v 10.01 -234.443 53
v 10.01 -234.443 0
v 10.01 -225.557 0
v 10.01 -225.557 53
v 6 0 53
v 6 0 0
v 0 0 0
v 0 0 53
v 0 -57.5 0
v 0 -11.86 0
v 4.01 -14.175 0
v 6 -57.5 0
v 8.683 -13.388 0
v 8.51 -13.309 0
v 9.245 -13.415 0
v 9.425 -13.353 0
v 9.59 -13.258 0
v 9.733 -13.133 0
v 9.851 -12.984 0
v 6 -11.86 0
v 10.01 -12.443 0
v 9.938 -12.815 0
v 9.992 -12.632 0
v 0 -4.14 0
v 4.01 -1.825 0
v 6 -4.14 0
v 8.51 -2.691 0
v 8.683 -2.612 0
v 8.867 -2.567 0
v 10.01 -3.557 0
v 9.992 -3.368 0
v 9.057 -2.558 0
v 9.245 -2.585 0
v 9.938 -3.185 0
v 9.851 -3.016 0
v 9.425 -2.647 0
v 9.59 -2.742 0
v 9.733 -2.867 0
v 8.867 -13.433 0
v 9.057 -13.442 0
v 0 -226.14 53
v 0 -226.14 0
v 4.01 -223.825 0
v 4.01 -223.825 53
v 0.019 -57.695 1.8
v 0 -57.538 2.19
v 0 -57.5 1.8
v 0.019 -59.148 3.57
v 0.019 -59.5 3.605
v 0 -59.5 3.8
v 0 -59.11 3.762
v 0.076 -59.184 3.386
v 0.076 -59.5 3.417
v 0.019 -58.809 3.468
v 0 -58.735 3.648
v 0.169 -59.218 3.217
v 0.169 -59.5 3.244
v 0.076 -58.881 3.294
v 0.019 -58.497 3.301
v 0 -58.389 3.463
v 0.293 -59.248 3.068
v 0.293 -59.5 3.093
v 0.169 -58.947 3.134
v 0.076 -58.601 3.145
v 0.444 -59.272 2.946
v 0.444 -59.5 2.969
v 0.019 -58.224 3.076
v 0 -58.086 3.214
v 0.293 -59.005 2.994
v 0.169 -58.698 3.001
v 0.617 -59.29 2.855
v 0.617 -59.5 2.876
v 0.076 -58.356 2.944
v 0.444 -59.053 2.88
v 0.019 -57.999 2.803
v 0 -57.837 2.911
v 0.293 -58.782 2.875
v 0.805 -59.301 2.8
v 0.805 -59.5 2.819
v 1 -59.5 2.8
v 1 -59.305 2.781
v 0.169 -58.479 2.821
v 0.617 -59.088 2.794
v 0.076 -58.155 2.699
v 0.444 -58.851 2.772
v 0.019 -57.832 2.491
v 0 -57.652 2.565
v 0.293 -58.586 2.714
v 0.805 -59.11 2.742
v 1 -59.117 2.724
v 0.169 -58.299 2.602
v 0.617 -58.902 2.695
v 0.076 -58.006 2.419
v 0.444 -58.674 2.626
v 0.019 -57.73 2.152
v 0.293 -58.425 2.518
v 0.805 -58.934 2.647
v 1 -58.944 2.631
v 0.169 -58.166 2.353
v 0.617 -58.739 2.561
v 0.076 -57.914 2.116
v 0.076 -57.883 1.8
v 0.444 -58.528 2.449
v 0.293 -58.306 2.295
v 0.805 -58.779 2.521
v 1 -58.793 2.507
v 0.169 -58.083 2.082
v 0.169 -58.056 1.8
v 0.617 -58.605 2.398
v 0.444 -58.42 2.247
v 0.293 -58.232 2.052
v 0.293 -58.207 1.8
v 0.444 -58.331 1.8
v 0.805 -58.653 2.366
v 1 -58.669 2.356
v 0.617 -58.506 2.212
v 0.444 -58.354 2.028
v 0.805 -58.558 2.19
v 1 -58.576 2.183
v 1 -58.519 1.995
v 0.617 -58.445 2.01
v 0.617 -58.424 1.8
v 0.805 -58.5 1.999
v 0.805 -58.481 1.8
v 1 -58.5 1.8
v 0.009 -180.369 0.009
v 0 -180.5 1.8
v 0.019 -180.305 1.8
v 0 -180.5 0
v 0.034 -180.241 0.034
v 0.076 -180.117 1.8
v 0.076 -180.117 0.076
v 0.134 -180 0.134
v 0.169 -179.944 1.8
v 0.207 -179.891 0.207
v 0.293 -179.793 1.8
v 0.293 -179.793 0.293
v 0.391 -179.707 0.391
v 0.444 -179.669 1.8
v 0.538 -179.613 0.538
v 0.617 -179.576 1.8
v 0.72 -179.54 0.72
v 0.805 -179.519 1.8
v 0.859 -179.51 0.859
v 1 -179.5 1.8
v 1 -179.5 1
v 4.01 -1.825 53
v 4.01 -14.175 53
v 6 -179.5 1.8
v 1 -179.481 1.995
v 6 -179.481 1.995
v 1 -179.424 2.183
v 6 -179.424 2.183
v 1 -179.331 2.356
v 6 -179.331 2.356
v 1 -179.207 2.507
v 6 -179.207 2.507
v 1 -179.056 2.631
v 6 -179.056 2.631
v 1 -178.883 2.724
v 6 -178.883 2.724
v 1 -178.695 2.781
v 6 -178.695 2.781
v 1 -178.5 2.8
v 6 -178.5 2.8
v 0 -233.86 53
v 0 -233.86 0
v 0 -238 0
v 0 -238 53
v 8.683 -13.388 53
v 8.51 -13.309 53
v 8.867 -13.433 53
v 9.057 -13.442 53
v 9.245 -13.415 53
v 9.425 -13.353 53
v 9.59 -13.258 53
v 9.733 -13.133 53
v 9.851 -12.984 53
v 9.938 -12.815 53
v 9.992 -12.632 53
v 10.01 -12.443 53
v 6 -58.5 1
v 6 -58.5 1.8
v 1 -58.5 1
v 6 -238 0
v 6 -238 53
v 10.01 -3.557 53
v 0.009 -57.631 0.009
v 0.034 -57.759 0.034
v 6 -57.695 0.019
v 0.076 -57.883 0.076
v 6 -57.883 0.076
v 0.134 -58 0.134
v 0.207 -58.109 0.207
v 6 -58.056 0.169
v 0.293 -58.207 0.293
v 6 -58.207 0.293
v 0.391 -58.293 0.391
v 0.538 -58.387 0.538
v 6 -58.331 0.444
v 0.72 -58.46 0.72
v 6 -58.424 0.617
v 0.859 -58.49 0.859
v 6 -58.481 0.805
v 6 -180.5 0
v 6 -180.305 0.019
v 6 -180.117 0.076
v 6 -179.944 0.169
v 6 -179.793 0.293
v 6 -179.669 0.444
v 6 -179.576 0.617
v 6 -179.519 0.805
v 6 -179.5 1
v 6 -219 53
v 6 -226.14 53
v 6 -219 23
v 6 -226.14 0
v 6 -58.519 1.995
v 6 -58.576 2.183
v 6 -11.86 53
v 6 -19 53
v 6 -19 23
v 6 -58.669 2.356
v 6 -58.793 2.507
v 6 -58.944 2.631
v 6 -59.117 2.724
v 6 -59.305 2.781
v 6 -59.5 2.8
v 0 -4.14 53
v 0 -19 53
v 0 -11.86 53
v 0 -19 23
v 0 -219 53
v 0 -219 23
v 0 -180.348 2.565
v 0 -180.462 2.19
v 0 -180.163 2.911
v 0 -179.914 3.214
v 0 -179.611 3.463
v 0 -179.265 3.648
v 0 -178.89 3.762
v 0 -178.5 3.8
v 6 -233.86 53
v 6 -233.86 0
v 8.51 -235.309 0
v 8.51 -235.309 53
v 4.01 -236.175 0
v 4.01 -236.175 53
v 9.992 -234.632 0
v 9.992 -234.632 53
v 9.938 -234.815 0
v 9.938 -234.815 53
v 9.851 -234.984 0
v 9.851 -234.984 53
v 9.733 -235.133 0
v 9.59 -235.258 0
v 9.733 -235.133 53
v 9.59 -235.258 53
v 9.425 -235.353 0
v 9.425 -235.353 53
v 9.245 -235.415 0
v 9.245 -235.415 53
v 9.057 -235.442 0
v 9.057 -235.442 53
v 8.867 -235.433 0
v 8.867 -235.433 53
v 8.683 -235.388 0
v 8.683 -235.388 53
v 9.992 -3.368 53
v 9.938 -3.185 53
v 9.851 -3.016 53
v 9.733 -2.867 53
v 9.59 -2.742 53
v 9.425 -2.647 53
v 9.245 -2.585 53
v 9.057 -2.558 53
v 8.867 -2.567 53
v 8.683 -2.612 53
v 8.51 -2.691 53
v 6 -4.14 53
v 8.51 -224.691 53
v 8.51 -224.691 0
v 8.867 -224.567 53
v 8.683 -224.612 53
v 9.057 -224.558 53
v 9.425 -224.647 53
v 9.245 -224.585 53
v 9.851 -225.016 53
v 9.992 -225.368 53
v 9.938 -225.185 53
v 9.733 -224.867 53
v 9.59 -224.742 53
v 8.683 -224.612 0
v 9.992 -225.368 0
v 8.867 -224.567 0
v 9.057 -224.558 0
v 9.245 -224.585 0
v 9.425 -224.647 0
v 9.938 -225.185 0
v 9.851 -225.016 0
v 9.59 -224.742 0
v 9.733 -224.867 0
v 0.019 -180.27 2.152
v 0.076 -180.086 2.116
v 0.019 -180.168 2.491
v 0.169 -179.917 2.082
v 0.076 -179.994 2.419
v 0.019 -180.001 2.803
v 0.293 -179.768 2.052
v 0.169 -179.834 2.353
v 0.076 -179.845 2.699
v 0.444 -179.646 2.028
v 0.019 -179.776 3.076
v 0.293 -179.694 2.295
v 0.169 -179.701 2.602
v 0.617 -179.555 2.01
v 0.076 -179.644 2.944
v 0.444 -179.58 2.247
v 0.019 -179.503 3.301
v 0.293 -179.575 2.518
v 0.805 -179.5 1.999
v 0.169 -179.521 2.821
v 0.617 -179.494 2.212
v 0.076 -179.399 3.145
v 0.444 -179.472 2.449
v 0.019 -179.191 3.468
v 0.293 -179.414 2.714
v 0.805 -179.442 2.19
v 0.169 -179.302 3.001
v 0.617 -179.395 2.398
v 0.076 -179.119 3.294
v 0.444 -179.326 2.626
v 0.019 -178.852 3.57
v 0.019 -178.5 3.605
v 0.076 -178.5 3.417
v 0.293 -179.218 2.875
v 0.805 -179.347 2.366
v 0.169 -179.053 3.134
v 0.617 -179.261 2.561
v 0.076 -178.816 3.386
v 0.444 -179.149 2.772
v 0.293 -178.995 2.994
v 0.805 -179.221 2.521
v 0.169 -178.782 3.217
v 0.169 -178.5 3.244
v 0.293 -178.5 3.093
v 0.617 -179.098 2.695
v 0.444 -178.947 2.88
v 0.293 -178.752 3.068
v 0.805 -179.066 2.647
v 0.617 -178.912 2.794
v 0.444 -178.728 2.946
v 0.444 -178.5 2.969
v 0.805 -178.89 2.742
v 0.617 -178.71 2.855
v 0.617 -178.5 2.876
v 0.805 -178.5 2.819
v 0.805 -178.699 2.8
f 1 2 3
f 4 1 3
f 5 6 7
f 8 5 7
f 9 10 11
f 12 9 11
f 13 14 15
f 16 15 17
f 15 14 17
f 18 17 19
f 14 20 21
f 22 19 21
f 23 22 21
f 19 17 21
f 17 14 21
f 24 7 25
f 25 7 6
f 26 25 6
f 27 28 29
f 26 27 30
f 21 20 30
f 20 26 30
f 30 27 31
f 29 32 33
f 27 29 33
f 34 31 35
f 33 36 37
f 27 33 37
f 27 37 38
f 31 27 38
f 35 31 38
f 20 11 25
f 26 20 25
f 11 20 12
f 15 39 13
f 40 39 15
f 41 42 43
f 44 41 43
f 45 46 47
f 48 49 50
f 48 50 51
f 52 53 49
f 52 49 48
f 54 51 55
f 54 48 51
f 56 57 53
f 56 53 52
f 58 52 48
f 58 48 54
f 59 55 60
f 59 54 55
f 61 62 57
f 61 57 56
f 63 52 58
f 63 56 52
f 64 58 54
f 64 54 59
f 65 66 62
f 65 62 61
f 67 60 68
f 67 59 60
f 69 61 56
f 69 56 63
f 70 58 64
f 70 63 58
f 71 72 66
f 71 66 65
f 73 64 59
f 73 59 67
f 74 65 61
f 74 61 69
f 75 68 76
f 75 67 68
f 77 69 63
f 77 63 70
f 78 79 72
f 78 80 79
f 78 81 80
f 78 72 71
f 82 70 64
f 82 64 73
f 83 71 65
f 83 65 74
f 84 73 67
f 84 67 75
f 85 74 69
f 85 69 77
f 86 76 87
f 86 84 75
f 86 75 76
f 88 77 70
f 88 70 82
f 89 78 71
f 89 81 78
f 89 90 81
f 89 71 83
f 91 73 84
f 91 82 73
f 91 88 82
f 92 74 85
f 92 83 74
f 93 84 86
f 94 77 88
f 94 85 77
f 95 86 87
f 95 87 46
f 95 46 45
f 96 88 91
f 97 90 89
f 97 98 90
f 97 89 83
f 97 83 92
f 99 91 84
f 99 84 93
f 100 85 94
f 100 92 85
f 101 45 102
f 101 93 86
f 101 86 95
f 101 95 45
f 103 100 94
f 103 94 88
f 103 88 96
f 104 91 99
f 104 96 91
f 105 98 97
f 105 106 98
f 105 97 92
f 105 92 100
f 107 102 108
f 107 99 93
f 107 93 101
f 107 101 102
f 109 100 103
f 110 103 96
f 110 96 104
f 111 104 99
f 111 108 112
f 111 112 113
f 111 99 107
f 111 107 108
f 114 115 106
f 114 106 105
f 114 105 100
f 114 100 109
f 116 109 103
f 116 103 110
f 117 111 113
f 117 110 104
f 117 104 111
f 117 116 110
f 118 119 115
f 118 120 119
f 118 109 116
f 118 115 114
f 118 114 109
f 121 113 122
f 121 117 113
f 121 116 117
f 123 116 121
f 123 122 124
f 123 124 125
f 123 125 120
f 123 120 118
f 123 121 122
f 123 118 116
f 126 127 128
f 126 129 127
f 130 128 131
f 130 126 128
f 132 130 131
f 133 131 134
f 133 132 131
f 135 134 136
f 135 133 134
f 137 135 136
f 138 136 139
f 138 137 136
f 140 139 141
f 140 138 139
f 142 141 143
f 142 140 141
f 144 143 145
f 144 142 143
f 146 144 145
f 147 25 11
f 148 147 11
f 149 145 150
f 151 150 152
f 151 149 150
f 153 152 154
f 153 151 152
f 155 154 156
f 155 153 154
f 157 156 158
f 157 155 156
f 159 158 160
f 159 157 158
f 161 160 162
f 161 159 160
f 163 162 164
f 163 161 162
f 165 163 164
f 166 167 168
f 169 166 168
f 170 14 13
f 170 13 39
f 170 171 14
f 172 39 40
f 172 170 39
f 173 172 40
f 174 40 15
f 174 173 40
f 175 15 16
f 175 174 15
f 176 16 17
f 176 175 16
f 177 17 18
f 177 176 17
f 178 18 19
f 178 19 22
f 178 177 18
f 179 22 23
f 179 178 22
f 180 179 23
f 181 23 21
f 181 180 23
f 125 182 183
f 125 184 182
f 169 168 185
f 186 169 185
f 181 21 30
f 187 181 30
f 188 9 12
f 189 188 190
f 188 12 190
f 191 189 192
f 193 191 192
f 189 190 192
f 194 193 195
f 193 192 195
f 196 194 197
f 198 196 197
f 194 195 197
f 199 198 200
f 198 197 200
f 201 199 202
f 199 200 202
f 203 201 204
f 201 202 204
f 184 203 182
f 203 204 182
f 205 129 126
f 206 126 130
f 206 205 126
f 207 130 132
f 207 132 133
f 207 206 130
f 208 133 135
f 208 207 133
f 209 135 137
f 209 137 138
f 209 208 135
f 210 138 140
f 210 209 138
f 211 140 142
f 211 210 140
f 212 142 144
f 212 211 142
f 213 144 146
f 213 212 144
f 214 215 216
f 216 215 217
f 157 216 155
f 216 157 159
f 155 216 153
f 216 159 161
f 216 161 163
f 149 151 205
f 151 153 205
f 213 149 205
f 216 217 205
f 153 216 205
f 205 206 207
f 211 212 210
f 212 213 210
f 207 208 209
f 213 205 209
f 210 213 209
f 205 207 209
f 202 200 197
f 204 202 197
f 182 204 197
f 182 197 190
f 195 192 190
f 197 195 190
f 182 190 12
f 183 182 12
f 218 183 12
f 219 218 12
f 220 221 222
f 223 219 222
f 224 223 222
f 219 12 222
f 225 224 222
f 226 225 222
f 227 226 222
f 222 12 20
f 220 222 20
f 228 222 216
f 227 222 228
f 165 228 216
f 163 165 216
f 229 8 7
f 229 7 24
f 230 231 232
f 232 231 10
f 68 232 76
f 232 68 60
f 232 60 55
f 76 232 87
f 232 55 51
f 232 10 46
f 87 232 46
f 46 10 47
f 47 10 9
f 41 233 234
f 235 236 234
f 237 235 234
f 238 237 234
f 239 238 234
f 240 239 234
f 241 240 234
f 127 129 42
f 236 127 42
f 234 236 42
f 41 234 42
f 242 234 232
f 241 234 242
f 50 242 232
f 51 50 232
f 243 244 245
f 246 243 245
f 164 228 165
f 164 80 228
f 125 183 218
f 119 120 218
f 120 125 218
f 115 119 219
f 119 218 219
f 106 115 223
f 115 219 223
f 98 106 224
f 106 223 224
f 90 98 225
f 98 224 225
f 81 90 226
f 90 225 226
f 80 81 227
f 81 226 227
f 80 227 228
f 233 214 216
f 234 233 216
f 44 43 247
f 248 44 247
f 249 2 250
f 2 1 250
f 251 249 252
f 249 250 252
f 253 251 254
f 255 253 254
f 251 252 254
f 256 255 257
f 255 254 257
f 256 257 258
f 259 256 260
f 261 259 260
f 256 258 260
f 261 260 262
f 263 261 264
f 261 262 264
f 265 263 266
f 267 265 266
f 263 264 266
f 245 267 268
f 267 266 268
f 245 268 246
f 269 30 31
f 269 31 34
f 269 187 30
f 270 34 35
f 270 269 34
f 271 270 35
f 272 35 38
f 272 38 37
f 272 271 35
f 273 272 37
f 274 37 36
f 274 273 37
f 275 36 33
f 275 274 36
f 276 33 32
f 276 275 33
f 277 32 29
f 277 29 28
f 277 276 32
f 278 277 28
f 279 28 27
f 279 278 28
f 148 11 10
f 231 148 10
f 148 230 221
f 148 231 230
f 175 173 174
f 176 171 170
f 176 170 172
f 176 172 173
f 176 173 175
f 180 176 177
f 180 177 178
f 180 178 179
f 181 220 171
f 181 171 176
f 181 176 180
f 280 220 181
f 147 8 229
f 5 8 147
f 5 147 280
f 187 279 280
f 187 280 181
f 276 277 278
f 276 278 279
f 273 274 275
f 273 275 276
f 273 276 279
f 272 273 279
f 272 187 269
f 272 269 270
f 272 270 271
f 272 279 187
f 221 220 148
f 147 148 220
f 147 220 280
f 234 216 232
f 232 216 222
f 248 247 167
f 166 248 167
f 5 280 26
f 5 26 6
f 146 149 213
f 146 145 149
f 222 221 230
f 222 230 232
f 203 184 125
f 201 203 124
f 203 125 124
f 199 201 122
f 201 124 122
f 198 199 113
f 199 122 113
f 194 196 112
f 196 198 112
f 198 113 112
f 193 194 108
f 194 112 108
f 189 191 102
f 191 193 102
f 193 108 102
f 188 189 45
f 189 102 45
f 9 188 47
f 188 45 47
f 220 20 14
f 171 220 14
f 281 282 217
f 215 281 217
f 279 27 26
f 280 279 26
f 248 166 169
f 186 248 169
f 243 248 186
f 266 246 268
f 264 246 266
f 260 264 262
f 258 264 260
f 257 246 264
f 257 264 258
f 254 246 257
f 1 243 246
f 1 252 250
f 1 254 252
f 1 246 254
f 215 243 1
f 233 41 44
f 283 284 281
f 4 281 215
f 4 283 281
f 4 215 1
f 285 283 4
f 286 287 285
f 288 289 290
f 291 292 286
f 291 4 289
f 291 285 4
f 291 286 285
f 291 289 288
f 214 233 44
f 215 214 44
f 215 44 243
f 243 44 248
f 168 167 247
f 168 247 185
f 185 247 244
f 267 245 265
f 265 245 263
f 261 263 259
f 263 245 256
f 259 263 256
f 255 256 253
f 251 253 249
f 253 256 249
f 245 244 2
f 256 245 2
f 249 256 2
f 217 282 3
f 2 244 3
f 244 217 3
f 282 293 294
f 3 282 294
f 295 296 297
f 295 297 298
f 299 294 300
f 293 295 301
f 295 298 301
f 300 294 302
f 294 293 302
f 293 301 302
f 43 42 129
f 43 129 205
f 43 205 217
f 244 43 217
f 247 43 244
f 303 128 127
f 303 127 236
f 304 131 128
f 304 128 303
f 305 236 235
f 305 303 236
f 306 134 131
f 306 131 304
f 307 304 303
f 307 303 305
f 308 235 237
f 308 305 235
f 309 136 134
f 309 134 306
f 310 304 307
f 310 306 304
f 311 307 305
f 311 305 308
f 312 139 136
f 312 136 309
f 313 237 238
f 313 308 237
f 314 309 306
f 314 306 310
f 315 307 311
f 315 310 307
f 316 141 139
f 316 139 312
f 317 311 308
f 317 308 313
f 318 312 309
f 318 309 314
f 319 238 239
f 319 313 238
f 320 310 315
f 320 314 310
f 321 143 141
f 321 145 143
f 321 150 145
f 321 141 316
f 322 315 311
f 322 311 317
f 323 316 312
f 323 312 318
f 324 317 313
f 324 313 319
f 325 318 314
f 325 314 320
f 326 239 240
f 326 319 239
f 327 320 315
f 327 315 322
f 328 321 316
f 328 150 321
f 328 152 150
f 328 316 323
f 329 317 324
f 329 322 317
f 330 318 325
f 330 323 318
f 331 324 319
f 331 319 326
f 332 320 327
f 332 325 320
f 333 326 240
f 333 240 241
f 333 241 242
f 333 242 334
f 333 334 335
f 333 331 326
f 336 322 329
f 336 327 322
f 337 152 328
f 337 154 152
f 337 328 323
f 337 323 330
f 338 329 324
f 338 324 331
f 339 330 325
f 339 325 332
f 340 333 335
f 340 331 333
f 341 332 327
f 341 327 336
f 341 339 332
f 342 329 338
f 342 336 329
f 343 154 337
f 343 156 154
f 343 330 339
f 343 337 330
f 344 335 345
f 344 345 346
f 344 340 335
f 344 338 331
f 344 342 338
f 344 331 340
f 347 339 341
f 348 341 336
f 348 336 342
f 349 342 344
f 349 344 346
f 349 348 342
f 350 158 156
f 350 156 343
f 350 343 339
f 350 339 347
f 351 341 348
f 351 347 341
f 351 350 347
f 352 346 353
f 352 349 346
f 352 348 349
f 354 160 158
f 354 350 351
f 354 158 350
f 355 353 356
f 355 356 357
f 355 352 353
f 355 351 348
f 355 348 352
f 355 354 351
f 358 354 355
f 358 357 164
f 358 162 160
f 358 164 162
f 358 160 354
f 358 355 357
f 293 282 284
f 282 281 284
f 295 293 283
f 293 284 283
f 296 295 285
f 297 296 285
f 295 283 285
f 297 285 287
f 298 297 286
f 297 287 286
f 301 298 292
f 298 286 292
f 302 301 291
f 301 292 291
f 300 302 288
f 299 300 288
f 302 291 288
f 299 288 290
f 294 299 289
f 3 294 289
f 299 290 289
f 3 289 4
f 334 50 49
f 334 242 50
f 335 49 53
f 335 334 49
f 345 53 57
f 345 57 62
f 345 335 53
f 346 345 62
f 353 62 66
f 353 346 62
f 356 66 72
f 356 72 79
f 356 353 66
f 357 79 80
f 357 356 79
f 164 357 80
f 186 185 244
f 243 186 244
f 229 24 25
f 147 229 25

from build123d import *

# Parameters (mm, degrees)
BOSS_EXTRUDE1_DEPTH = 53
CUT_EXTRUDE1_DEPTH  = 52
FILLET1_R           = 1
FILLET3_R           = 1
SKETCH4_W           = 30
SKETCH4_H           = 200
CUT_EXTRUDE2_DEPTH  = 10


with BuildPart() as part:
    # Sketch2 → Boss-Extrude1 (new body)
    with BuildSketch(Plane.XY):
        Polygon((0, 0), (0, -4.14), (4.00969762, -1.825), (4.00969762, -14.175), (0, -11.86), (0, -19), (0, -219), (0, -226.14), (4.00969762, -223.825), (4.00969762, -236.175), (0, -233.86), (0, -238), (6, -238), (6, -233.86), (10.00969762, -236.175), (10.00969762, -223.825), (6, -226.14), (6, -11.86), (10.00969762, -14.175), (10.00969762, -1.825), (6, -4.14), (6, 0), align=None)
    extrude(amount=BOSS_EXTRUDE1_DEPTH)

    # Sketch3 → Cut-Extrude1 (cut)
    with BuildSketch(Plane(origin=(0, 0, 0), x_dir=(0, 0, -1), z_dir=(1, 0, 0))):
        Polygon((0, -119), (0, -58.5), (-2.8, -58.5), (-2.8, -179.5), (0, -179.5), align=None)
    extrude(amount=CUT_EXTRUDE1_DEPTH, mode=Mode.SUBTRACT)

    # Fillet1
    fillet1_edges = [part.edges().sort_by_distance(p)[0] for p in [
        (3, -179.5, 0),
        (3, -58.5, 0),
        (3, -58.5, 2.8),
        (0, -119, 2.8),
        (0, -58.5, 1.4),
        (3, -179.5, 2.8),
        (0, -179.5, 1.4),
    ]]
    fillet(fillet1_edges, radius=FILLET1_R)

    # Fillet3
    fillet3_edges = [part.edges().sort_by_distance(p)[0] for p in [
        (10.00969762, -1.825, 26.5),
        (10.00969762, -14.175, 26.5),
        (10.00969762, -223.825, 26.5),
        (10.00969762, -236.175, 26.5),
    ]]
    fillet(fillet3_edges, radius=FILLET3_R)

    # Sketch4 → Cut-Extrude2 (cut)
    with BuildSketch(Plane(origin=(6, 0, 0), x_dir=(0, 0, -1), z_dir=(1, 0, 0))):
        with Locations((-38, -119)):
            Rectangle(SKETCH4_W, SKETCH4_H)
    extrude(amount=-CUT_EXTRUDE2_DEPTH, mode=Mode.SUBTRACT)


solid = part.part
